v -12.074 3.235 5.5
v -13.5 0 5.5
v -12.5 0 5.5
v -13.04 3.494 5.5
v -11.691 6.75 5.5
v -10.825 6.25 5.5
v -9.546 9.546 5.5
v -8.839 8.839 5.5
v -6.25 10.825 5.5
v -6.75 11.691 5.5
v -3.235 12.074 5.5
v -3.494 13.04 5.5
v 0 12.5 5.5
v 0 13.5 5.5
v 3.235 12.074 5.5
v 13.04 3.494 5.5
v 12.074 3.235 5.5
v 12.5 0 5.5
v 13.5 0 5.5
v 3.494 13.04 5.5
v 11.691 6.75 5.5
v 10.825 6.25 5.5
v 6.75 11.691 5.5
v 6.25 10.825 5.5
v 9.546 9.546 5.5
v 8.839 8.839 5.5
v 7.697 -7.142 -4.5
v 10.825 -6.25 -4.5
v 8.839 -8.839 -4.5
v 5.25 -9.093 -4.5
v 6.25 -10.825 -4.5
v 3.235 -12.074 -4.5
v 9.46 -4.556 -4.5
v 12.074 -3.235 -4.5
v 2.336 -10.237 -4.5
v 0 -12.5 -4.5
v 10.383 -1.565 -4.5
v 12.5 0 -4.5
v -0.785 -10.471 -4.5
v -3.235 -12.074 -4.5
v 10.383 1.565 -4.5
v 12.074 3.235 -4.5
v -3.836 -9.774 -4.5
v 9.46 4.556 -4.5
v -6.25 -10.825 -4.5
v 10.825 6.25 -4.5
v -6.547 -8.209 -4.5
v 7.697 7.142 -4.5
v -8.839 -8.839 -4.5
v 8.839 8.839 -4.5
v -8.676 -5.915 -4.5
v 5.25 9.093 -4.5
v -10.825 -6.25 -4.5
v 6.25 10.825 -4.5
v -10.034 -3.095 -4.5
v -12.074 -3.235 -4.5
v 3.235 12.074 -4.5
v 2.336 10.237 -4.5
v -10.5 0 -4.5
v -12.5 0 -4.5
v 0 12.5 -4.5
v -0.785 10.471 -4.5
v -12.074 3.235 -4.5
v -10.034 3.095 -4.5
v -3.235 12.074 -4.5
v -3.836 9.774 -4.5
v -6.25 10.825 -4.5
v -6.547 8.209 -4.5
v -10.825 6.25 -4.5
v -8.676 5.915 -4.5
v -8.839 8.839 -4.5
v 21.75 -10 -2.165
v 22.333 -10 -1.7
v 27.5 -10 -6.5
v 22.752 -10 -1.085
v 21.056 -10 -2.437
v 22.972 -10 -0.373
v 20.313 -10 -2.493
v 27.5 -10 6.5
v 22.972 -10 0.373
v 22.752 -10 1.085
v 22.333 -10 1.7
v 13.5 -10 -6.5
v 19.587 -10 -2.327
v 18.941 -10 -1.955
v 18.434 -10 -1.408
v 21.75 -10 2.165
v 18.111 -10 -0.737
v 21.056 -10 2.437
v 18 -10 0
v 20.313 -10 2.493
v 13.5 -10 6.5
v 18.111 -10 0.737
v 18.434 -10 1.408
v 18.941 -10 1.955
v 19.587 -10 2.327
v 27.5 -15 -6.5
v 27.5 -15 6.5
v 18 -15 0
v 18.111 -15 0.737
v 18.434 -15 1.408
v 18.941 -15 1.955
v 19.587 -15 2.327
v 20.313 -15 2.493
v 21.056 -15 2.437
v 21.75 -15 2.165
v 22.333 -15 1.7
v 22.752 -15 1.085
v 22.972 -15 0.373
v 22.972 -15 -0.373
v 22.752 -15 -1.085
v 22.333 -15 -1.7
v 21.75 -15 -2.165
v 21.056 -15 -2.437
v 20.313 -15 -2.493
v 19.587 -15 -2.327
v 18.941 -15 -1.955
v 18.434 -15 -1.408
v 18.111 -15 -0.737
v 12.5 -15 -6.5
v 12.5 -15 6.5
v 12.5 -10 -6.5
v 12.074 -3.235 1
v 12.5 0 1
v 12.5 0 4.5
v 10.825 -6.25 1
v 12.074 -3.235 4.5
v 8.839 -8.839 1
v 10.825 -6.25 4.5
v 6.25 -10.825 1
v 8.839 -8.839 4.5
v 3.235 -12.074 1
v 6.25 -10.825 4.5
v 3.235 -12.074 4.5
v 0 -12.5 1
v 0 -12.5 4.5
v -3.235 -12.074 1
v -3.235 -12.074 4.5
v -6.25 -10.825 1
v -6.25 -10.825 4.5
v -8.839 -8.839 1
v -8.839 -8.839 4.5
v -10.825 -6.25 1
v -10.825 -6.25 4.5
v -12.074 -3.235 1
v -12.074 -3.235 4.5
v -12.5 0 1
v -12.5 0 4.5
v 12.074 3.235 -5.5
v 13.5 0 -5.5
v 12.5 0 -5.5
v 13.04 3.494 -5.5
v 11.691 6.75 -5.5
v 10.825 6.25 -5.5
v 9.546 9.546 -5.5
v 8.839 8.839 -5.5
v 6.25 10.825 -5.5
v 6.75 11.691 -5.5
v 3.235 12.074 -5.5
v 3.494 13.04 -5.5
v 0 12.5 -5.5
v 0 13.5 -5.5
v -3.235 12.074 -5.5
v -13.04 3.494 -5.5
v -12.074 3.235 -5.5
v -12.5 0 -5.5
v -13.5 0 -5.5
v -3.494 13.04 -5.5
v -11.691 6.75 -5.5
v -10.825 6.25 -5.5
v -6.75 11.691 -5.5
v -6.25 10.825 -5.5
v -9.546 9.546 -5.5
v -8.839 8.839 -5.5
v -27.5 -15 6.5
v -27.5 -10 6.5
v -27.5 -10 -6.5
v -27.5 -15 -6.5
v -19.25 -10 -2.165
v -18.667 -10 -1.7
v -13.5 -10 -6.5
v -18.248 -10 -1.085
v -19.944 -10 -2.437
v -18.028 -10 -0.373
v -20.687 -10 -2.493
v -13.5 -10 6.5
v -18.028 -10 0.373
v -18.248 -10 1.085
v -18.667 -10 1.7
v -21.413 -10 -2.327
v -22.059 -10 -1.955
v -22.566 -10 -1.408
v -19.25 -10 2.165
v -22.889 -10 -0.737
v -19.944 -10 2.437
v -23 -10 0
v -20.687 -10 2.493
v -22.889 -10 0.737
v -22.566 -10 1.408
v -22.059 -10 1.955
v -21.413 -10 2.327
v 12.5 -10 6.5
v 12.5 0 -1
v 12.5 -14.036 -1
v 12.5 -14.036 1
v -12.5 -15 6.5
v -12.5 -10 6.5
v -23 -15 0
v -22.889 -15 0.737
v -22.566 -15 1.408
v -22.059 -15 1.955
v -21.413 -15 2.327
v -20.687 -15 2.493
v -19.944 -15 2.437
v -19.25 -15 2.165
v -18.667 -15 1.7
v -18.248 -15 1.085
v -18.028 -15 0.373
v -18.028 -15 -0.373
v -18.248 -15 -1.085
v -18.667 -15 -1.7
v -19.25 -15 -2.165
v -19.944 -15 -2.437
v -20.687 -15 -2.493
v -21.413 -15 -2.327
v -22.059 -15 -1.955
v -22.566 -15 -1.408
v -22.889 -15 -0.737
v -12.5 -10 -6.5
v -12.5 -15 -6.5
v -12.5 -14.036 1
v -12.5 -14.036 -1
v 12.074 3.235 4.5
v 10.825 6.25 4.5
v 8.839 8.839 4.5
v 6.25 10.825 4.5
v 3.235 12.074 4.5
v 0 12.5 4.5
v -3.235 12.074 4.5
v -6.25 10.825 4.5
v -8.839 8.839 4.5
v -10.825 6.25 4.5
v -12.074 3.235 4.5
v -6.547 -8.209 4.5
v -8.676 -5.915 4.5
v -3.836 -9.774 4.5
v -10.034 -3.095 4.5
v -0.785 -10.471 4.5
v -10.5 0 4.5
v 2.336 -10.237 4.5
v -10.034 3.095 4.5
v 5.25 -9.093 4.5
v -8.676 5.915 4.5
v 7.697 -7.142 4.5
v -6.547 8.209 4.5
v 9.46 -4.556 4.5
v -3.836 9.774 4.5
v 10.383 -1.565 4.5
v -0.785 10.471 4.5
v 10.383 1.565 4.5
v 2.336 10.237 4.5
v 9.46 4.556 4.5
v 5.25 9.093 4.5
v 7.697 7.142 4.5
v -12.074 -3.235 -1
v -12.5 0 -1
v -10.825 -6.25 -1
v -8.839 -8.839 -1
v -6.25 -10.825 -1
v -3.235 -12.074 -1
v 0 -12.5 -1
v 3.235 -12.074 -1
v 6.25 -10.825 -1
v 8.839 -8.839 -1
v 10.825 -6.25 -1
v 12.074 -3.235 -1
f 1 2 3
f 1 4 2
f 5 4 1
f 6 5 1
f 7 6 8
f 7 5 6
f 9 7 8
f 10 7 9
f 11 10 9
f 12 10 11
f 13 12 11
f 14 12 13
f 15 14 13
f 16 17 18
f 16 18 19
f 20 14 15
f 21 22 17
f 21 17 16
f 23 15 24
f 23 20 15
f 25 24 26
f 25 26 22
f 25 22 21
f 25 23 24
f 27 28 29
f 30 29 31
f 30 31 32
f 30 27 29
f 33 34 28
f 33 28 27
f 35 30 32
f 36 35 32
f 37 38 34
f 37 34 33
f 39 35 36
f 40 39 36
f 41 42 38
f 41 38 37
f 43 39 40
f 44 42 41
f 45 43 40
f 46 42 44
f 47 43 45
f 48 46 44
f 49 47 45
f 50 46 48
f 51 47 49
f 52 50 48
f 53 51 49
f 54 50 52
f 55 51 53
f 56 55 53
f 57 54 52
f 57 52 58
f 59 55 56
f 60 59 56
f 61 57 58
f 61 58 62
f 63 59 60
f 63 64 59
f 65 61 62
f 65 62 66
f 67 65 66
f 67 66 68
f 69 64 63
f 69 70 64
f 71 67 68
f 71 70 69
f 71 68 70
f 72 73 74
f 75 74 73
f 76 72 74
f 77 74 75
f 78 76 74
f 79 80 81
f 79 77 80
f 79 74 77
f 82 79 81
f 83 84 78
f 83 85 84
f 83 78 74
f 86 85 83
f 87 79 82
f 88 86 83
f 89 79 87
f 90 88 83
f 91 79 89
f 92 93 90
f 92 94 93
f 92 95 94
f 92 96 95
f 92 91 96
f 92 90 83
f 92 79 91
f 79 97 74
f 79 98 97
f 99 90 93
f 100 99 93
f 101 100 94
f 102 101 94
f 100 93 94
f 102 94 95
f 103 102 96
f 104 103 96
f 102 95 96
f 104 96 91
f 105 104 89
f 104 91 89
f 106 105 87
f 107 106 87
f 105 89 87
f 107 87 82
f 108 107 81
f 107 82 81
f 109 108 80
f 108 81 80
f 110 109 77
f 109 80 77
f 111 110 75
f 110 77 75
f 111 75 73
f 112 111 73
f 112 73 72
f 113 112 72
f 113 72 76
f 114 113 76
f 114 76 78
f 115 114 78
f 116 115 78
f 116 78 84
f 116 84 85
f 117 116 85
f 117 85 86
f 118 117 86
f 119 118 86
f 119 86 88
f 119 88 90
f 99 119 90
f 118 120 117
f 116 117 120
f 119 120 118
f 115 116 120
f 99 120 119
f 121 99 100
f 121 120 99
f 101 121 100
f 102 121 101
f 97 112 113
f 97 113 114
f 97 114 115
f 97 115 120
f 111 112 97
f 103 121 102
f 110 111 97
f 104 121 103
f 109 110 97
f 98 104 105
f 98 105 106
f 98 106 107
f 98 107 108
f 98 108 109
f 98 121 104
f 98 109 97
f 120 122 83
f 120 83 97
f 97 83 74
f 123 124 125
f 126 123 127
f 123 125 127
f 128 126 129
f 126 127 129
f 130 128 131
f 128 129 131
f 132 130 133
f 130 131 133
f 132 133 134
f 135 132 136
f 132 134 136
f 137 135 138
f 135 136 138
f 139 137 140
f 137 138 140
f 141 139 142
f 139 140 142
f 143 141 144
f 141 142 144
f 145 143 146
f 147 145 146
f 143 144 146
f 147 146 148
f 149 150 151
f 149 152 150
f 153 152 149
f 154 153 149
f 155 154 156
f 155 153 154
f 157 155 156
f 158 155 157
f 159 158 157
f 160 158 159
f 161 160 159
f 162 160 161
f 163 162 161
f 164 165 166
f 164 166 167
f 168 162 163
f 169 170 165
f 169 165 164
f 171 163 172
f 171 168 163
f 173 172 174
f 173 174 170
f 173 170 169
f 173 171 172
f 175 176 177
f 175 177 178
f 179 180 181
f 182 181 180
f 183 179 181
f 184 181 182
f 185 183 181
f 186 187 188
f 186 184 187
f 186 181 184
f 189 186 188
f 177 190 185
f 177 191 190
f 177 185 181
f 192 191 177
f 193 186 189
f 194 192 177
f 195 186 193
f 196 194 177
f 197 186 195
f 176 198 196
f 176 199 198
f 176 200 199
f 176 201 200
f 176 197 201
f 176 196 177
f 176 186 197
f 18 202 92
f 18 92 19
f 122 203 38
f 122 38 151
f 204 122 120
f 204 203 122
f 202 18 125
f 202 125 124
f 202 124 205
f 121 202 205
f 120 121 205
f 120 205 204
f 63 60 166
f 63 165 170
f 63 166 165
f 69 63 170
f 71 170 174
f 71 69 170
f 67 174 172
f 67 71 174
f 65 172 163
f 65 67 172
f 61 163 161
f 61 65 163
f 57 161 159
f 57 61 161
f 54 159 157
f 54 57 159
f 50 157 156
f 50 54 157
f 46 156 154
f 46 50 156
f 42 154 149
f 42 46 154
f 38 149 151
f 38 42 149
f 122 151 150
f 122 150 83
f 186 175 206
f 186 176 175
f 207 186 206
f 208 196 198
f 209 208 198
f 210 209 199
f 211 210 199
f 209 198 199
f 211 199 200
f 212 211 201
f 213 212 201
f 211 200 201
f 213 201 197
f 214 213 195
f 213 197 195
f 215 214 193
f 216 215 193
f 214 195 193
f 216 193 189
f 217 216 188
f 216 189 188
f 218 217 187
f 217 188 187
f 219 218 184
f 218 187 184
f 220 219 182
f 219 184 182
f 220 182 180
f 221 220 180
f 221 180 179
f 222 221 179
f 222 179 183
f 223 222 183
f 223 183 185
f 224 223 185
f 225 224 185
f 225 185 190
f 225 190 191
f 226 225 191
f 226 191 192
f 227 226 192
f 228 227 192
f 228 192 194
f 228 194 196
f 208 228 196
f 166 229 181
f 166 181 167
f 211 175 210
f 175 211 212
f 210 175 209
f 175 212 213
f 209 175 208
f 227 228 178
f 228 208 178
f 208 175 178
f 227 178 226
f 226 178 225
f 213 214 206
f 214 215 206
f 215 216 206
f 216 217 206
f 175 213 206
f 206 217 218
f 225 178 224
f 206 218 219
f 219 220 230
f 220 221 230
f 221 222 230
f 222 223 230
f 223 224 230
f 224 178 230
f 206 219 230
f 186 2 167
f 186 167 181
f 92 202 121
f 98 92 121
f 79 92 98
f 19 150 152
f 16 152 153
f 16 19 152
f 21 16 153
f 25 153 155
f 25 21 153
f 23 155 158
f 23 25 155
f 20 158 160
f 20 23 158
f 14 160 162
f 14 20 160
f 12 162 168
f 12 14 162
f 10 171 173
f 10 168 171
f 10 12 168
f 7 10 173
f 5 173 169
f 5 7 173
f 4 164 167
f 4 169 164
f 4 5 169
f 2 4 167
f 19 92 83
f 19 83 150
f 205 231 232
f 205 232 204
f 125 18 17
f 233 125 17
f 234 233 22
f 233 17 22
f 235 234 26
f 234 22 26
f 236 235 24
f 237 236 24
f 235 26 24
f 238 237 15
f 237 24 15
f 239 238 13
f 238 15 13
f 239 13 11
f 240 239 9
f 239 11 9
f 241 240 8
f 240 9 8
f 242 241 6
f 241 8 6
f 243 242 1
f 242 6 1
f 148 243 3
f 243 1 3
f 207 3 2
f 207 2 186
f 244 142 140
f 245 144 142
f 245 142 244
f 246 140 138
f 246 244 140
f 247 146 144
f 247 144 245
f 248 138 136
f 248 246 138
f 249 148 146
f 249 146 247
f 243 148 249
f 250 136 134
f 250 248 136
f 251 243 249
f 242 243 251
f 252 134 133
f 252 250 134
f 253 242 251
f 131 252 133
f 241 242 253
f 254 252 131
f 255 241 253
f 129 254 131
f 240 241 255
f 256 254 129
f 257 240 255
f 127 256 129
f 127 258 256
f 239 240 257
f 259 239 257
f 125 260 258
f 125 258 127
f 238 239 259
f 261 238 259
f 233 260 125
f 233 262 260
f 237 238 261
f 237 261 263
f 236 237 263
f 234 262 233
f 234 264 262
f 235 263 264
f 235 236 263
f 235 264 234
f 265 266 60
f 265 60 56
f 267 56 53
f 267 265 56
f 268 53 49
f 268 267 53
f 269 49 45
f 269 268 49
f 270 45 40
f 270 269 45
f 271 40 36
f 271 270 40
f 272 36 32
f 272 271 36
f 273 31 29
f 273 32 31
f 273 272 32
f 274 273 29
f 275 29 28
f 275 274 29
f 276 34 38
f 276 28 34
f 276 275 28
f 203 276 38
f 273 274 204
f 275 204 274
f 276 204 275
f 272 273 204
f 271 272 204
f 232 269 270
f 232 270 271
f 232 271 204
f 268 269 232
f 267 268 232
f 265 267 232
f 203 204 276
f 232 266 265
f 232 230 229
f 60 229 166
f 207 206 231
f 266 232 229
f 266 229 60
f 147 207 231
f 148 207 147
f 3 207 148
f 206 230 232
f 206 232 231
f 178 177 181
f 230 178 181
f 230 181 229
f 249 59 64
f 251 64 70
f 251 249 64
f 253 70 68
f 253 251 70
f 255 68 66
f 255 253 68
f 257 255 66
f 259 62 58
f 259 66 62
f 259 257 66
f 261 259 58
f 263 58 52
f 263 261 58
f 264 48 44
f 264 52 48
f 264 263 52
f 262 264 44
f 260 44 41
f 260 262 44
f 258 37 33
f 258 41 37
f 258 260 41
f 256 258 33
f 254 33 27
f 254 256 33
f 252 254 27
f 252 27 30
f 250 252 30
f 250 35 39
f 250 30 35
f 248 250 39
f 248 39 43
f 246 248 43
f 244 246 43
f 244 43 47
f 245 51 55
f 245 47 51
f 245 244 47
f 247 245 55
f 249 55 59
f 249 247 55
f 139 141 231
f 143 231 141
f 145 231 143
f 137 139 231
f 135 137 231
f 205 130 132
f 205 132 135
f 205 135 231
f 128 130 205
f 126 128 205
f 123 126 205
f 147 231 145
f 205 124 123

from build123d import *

# Parameters (mm, degrees)
SKETCH1_R                = 12.5
SKETCH1_R_2              = 4
BOSS_EXTRUDE1_DEPTH      = 6.5
CUT_EXTRUDE1_DEPTH       = 5.5
CUT_EXTRUDE2_START       = -5.5
CUT_EXTRUDE2_DEPTH       = 5.5
SKETCH5_R                = 12.5
SKETCH5_R_2              = 10.5
CUT_EXTRUDE3_DEPTH       = 2
CUT_EXTRUDE4_START       = -2
SKETCH6_R                = 12.5
SKETCH6_R_2              = 10.5
CUT_EXTRUDE4_DEPTH       = 2
CUT_EXTRUDE5_START       = -13
SKETCH7_R                = 10.5
CUT_EXTRUDE5_DEPTH       = 13
SKETCH8_R                = 2.5
CUT_EXTRUDE6_DEPTH       = 13
CUT_EXTRUDE7_DEPTH       = 1
CUT_EXTRUDE8_START       = -1
CUT_EXTRUDE8_DEPTH       = 1
CUT_EXTRUDE9_START       = -1
CUT_EXTRUDE9_DEPTH       = 1
CUT_EXTRUDE10_DEPTH      = 45.138985036
CUT_EXTRUDE10_DEPTH_BACK = 1
CUT_EXTRUDE11_START      = -1
CUT_EXTRUDE11_DEPTH      = 1
CUT_EXTRUDE12_DEPTH      = 45.138985036
CUT_EXTRUDE12_DEPTH_BACK = 1


# Read off the part's stored shape, not the designer's step: Cut-Extrude9, Cut-Extrude11
with BuildPart() as part:
    # Sketch1 → Boss-Extrude1 (new, symmetric)
    # profile 1 of 10: a face of its own
    with BuildSketch(Plane.XY):
        Circle(SKETCH1_R)
        with Locations(Location((0, 0, 0), (0, 0, 180))):
            Circle(SKETCH1_R_2, mode=Mode.SUBTRACT)
    # profile 2 of 10: a face of its own
    with BuildSketch(Plane.XY):
        with BuildLine():
            ThreePointArc((-13.5, 0), (-13.247641299, -2.598076211), (-12.5, -5.099019514))
            Line((-12.5, -5.099019514), (-12.5, 0))
            ThreePointArc((-12.5, 0), (0, 12.5), (12.5, 0))
            Line((12.5, 0), (12.5, -5.099019514))
            ThreePointArc((12.5, -5.099019514), (13.247641299, -2.598076211), (13.5, 0))
            ThreePointArc((13.5, 0), (0, 13.5), (-13.5, 0))
        make_face()
    # profile 3 of 10: a face of its own
    with BuildSketch(Plane.XY):
        with BuildLine():
            Line((-12.5, 0), (-12.5, -5.099019514))
            ThreePointArc((-12.5, -5.099019514), (0, -13.5), (12.5, -5.099019514))
            Line((12.5, -5.099019514), (12.5, 0))
            ThreePointArc((12.5, 0), (0, -12.5), (-12.5, 0))
        make_face()
    # profile 4 of 10: a face of its own
    with BuildSketch(Plane.XY):
        with BuildLine():
            ThreePointArc((-13.5, 0), (-13.247641299, -2.598076211), (-12.5, -5.099019514))
            Line((-12.5, -5.099019514), (-12.5, 0))
            ThreePointArc((-12.5, 0), (0, 12.5), (12.5, 0))
            Line((12.5, 0), (12.5, -5.099019514))
            ThreePointArc((12.5, -5.099019514), (13.247641299, -2.598076211), (13.5, 0))
            ThreePointArc((13.5, 0), (0, 13.5), (-13.5, 0))
        make_face()
    # profile 5 of 10: a face of its own
    with BuildSketch(Plane.XY):
        with BuildLine():
            Line((-12.5, 0), (-12.5, -5.099019514))
            ThreePointArc((-12.5, -5.099019514), (0, -13.5), (12.5, -5.099019514))
            Line((12.5, -5.099019514), (12.5, 0))
            ThreePointArc((12.5, 0), (0, -12.5), (-12.5, 0))
        make_face()
    # profile 6 of 10: a face of its own
    with BuildSketch(Plane.XY):
        with BuildLine():
            Line((-13.5, -10), (-12.5, -10))
            Line((-12.5, -10), (-12.5, -5.099019514))
            ThreePointArc((-12.5, -5.099019514), (-13.247641299, -2.598076211), (-13.5, 0))
            Line((-13.5, 0), (-13.5, -10))
        make_face()
    # profile 7 of 10: a face of its own
    with BuildSketch(Plane.XY):
        Polygon((-12.5, -14.03581164), (-12.5, -10), (-13.5, -10), (-27.5, -10), (-27.5, -15), (-12.5, -15), align=None)
    # profile 8 of 10: a face of its own
    with BuildSketch(Plane.XY):
        with BuildLine():
            Line((-12.5, -5.099019514), (-12.5, -10))
            Line((-12.5, -10), (-12.5, -14.03581164))
            Line((-12.5, -14.03581164), (12.5, -14.03581164))
            Line((12.5, -14.03581164), (12.5, -10))
            Line((12.5, -10), (12.5, -5.099019514))
            ThreePointArc((12.5, -5.099019514), (0, -13.5), (-12.5, -5.099019514))
        make_face()
    # profile 9 of 10: a face of its own
    with BuildSketch(Plane.XY):
        Polygon((12.5, -10), (12.5, -14.03581164), (12.5, -15), (27.5, -15), (27.5, -10), (13.5, -10), align=None)
    # profile 10 of 10: a face of its own
    with BuildSketch(Plane.XY):
        with BuildLine():
            ThreePointArc((13.5, 0), (13.247641299, -2.598076211), (12.5, -5.099019514))
            Line((12.5, -5.099019514), (12.5, -10))
            Line((12.5, -10), (13.5, -10))
            Line((13.5, -10), (13.5, 0))
        make_face()
    extrude(amount=BOSS_EXTRUDE1_DEPTH, both=True)

    # Sketch3 → Cut-Extrude1 (cut)
    with BuildSketch(Plane.XY.offset(6.5)):
        with BuildLine():
            Line((-12.5, 0), (-12.5, -14.03581164))
            Line((-12.5, -14.03581164), (12.5, -14.03581164))
            Line((12.5, -14.03581164), (12.5, 0))
            ThreePointArc((12.5, 0), (0, -12.5), (-12.5, 0))
        make_face()
    extrude(amount=-CUT_EXTRUDE1_DEPTH, mode=Mode.SUBTRACT)

    # Sketch4 → Cut-Extrude2 (cut)
    with BuildSketch(Plane(origin=(0, 0, -6.5), x_dir=(-1, 0, 0), z_dir=(0, 0, -1)).offset(CUT_EXTRUDE2_START)):
        with BuildLine():
            Line((-12.5, 0), (-12.5, -14.03581164))
            Line((-12.5, -14.03581164), (12.5, -14.03581164))
            Line((12.5, -14.03581164), (12.5, 0))
            ThreePointArc((12.5, 0), (0, -12.5), (-12.5, 0))
        make_face()
    extrude(amount=CUT_EXTRUDE2_DEPTH, mode=Mode.SUBTRACT)

    # Sketch5 → Cut-Extrude3 (cut)
    with BuildSketch(Plane.XY.offset(6.5)):
        Circle(SKETCH5_R)
        Circle(SKETCH5_R_2, mode=Mode.SUBTRACT)
    extrude(amount=-CUT_EXTRUDE3_DEPTH, mode=Mode.SUBTRACT)

    # Sketch6 → Cut-Extrude4 (cut)
    with BuildSketch(Plane(origin=(0, 0, -6.5), x_dir=(-1, 0, 0), z_dir=(0, 0, -1)).offset(CUT_EXTRUDE4_START)):
        Circle(SKETCH6_R)
        with Locations(Location((0, 0, 0), (0, 0, 180))):
            Circle(SKETCH6_R_2, mode=Mode.SUBTRACT)
    extrude(amount=CUT_EXTRUDE4_DEPTH, mode=Mode.SUBTRACT)

    # Sketch7 → Cut-Extrude5 (cut)
    with BuildSketch(Plane(origin=(0, 0, -6.5), x_dir=(-1, 0, 0), z_dir=(0, 0, -1)).offset(CUT_EXTRUDE5_START)):
        Circle(SKETCH7_R)
    extrude(amount=CUT_EXTRUDE5_DEPTH, mode=Mode.SUBTRACT)

    # Sketch8 → Cut-Extrude6 (cut)
    with BuildSketch(Plane(origin=(0, -10, 0), x_dir=(1, 0, 0), z_dir=(0, 1, 0))):
        with Locations(Location((20.5, 0, 0), (0, 0, 180))):
            Circle(SKETCH8_R)
        with Locations(Location((-20.5, 0, 0), (0, 0, 180))):
            Circle(SKETCH8_R)
    extrude(amount=-CUT_EXTRUDE6_DEPTH, mode=Mode.SUBTRACT)

    # Sketch10 → Cut-Extrude7 (cut)
    with BuildSketch(Plane.XY.offset(6.5)):
        with BuildLine():
            Line((-13.5, 0), (-12.5, 0))
            ThreePointArc((-12.5, 0), (0, 12.5), (12.5, 0))
            Line((12.5, 0), (13.5, 0))
            ThreePointArc((13.5, 0), (0, 13.5), (-13.5, 0))
        make_face()
    extrude(amount=-CUT_EXTRUDE7_DEPTH, mode=Mode.SUBTRACT)

    # Sketch11 → Cut-Extrude8 (cut)
    with BuildSketch(Plane(origin=(0, 0, -6.5), x_dir=(-1, 0, 0), z_dir=(0, 0, -1)).offset(CUT_EXTRUDE8_START)):
        with BuildLine():
            Line((-13.5, 0), (-12.5, 0))
            ThreePointArc((-12.5, 0), (0, 12.5), (12.5, 0))
            Line((12.5, 0), (13.5, 0))
            ThreePointArc((13.5, 0), (0, 13.5), (-13.5, 0))
        make_face()
    extrude(amount=CUT_EXTRUDE8_DEPTH, mode=Mode.SUBTRACT)

    # Cut-Extrude9 outline → Cut-Extrude9 (cut)
    with BuildSketch(Plane(origin=(13.5, 0, 0), x_dir=(0, 0, -1), z_dir=(1, 0, 0)).offset(CUT_EXTRUDE9_START)):
        Polygon((-6.5, 0), (-6.5, -10), (-5.5, 0), align=None)
    extrude(amount=CUT_EXTRUDE9_DEPTH, mode=Mode.SUBTRACT)

    # Sketch13 → Cut-Extrude10 (cut, two sides: drawn at the far end of the back side and taken through both)
    with BuildSketch(Plane(origin=(13.5, 0, 0), x_dir=(0, 0, -1), z_dir=(1, 0, 0)).offset(-CUT_EXTRUDE10_DEPTH_BACK)):
        Polygon((6.5, 0), (5.5, 0), (6.5, -10), align=None)
    extrude(amount=CUT_EXTRUDE10_DEPTH + CUT_EXTRUDE10_DEPTH_BACK, mode=Mode.SUBTRACT)

    # Cut-Extrude11 outline → Cut-Extrude11 (cut)
    with BuildSketch(Plane.ZY.offset(13.5).offset(CUT_EXTRUDE11_START)):
        Polygon((-6.5, 0), (-6.5, -10), (-5.5, 0), align=None)
    extrude(amount=CUT_EXTRUDE11_DEPTH, mode=Mode.SUBTRACT)

    # Sketch15 → Cut-Extrude12 (cut, two sides: drawn at the far end of the back side and taken through both)
    with BuildSketch(Plane.ZY.offset(13.5).offset(-CUT_EXTRUDE12_DEPTH_BACK)):
        Polygon((6.5, 0), (5.5, 0), (6.5, -10), align=None)
    extrude(amount=CUT_EXTRUDE12_DEPTH + CUT_EXTRUDE12_DEPTH_BACK, mode=Mode.SUBTRACT)


solid = part.part
